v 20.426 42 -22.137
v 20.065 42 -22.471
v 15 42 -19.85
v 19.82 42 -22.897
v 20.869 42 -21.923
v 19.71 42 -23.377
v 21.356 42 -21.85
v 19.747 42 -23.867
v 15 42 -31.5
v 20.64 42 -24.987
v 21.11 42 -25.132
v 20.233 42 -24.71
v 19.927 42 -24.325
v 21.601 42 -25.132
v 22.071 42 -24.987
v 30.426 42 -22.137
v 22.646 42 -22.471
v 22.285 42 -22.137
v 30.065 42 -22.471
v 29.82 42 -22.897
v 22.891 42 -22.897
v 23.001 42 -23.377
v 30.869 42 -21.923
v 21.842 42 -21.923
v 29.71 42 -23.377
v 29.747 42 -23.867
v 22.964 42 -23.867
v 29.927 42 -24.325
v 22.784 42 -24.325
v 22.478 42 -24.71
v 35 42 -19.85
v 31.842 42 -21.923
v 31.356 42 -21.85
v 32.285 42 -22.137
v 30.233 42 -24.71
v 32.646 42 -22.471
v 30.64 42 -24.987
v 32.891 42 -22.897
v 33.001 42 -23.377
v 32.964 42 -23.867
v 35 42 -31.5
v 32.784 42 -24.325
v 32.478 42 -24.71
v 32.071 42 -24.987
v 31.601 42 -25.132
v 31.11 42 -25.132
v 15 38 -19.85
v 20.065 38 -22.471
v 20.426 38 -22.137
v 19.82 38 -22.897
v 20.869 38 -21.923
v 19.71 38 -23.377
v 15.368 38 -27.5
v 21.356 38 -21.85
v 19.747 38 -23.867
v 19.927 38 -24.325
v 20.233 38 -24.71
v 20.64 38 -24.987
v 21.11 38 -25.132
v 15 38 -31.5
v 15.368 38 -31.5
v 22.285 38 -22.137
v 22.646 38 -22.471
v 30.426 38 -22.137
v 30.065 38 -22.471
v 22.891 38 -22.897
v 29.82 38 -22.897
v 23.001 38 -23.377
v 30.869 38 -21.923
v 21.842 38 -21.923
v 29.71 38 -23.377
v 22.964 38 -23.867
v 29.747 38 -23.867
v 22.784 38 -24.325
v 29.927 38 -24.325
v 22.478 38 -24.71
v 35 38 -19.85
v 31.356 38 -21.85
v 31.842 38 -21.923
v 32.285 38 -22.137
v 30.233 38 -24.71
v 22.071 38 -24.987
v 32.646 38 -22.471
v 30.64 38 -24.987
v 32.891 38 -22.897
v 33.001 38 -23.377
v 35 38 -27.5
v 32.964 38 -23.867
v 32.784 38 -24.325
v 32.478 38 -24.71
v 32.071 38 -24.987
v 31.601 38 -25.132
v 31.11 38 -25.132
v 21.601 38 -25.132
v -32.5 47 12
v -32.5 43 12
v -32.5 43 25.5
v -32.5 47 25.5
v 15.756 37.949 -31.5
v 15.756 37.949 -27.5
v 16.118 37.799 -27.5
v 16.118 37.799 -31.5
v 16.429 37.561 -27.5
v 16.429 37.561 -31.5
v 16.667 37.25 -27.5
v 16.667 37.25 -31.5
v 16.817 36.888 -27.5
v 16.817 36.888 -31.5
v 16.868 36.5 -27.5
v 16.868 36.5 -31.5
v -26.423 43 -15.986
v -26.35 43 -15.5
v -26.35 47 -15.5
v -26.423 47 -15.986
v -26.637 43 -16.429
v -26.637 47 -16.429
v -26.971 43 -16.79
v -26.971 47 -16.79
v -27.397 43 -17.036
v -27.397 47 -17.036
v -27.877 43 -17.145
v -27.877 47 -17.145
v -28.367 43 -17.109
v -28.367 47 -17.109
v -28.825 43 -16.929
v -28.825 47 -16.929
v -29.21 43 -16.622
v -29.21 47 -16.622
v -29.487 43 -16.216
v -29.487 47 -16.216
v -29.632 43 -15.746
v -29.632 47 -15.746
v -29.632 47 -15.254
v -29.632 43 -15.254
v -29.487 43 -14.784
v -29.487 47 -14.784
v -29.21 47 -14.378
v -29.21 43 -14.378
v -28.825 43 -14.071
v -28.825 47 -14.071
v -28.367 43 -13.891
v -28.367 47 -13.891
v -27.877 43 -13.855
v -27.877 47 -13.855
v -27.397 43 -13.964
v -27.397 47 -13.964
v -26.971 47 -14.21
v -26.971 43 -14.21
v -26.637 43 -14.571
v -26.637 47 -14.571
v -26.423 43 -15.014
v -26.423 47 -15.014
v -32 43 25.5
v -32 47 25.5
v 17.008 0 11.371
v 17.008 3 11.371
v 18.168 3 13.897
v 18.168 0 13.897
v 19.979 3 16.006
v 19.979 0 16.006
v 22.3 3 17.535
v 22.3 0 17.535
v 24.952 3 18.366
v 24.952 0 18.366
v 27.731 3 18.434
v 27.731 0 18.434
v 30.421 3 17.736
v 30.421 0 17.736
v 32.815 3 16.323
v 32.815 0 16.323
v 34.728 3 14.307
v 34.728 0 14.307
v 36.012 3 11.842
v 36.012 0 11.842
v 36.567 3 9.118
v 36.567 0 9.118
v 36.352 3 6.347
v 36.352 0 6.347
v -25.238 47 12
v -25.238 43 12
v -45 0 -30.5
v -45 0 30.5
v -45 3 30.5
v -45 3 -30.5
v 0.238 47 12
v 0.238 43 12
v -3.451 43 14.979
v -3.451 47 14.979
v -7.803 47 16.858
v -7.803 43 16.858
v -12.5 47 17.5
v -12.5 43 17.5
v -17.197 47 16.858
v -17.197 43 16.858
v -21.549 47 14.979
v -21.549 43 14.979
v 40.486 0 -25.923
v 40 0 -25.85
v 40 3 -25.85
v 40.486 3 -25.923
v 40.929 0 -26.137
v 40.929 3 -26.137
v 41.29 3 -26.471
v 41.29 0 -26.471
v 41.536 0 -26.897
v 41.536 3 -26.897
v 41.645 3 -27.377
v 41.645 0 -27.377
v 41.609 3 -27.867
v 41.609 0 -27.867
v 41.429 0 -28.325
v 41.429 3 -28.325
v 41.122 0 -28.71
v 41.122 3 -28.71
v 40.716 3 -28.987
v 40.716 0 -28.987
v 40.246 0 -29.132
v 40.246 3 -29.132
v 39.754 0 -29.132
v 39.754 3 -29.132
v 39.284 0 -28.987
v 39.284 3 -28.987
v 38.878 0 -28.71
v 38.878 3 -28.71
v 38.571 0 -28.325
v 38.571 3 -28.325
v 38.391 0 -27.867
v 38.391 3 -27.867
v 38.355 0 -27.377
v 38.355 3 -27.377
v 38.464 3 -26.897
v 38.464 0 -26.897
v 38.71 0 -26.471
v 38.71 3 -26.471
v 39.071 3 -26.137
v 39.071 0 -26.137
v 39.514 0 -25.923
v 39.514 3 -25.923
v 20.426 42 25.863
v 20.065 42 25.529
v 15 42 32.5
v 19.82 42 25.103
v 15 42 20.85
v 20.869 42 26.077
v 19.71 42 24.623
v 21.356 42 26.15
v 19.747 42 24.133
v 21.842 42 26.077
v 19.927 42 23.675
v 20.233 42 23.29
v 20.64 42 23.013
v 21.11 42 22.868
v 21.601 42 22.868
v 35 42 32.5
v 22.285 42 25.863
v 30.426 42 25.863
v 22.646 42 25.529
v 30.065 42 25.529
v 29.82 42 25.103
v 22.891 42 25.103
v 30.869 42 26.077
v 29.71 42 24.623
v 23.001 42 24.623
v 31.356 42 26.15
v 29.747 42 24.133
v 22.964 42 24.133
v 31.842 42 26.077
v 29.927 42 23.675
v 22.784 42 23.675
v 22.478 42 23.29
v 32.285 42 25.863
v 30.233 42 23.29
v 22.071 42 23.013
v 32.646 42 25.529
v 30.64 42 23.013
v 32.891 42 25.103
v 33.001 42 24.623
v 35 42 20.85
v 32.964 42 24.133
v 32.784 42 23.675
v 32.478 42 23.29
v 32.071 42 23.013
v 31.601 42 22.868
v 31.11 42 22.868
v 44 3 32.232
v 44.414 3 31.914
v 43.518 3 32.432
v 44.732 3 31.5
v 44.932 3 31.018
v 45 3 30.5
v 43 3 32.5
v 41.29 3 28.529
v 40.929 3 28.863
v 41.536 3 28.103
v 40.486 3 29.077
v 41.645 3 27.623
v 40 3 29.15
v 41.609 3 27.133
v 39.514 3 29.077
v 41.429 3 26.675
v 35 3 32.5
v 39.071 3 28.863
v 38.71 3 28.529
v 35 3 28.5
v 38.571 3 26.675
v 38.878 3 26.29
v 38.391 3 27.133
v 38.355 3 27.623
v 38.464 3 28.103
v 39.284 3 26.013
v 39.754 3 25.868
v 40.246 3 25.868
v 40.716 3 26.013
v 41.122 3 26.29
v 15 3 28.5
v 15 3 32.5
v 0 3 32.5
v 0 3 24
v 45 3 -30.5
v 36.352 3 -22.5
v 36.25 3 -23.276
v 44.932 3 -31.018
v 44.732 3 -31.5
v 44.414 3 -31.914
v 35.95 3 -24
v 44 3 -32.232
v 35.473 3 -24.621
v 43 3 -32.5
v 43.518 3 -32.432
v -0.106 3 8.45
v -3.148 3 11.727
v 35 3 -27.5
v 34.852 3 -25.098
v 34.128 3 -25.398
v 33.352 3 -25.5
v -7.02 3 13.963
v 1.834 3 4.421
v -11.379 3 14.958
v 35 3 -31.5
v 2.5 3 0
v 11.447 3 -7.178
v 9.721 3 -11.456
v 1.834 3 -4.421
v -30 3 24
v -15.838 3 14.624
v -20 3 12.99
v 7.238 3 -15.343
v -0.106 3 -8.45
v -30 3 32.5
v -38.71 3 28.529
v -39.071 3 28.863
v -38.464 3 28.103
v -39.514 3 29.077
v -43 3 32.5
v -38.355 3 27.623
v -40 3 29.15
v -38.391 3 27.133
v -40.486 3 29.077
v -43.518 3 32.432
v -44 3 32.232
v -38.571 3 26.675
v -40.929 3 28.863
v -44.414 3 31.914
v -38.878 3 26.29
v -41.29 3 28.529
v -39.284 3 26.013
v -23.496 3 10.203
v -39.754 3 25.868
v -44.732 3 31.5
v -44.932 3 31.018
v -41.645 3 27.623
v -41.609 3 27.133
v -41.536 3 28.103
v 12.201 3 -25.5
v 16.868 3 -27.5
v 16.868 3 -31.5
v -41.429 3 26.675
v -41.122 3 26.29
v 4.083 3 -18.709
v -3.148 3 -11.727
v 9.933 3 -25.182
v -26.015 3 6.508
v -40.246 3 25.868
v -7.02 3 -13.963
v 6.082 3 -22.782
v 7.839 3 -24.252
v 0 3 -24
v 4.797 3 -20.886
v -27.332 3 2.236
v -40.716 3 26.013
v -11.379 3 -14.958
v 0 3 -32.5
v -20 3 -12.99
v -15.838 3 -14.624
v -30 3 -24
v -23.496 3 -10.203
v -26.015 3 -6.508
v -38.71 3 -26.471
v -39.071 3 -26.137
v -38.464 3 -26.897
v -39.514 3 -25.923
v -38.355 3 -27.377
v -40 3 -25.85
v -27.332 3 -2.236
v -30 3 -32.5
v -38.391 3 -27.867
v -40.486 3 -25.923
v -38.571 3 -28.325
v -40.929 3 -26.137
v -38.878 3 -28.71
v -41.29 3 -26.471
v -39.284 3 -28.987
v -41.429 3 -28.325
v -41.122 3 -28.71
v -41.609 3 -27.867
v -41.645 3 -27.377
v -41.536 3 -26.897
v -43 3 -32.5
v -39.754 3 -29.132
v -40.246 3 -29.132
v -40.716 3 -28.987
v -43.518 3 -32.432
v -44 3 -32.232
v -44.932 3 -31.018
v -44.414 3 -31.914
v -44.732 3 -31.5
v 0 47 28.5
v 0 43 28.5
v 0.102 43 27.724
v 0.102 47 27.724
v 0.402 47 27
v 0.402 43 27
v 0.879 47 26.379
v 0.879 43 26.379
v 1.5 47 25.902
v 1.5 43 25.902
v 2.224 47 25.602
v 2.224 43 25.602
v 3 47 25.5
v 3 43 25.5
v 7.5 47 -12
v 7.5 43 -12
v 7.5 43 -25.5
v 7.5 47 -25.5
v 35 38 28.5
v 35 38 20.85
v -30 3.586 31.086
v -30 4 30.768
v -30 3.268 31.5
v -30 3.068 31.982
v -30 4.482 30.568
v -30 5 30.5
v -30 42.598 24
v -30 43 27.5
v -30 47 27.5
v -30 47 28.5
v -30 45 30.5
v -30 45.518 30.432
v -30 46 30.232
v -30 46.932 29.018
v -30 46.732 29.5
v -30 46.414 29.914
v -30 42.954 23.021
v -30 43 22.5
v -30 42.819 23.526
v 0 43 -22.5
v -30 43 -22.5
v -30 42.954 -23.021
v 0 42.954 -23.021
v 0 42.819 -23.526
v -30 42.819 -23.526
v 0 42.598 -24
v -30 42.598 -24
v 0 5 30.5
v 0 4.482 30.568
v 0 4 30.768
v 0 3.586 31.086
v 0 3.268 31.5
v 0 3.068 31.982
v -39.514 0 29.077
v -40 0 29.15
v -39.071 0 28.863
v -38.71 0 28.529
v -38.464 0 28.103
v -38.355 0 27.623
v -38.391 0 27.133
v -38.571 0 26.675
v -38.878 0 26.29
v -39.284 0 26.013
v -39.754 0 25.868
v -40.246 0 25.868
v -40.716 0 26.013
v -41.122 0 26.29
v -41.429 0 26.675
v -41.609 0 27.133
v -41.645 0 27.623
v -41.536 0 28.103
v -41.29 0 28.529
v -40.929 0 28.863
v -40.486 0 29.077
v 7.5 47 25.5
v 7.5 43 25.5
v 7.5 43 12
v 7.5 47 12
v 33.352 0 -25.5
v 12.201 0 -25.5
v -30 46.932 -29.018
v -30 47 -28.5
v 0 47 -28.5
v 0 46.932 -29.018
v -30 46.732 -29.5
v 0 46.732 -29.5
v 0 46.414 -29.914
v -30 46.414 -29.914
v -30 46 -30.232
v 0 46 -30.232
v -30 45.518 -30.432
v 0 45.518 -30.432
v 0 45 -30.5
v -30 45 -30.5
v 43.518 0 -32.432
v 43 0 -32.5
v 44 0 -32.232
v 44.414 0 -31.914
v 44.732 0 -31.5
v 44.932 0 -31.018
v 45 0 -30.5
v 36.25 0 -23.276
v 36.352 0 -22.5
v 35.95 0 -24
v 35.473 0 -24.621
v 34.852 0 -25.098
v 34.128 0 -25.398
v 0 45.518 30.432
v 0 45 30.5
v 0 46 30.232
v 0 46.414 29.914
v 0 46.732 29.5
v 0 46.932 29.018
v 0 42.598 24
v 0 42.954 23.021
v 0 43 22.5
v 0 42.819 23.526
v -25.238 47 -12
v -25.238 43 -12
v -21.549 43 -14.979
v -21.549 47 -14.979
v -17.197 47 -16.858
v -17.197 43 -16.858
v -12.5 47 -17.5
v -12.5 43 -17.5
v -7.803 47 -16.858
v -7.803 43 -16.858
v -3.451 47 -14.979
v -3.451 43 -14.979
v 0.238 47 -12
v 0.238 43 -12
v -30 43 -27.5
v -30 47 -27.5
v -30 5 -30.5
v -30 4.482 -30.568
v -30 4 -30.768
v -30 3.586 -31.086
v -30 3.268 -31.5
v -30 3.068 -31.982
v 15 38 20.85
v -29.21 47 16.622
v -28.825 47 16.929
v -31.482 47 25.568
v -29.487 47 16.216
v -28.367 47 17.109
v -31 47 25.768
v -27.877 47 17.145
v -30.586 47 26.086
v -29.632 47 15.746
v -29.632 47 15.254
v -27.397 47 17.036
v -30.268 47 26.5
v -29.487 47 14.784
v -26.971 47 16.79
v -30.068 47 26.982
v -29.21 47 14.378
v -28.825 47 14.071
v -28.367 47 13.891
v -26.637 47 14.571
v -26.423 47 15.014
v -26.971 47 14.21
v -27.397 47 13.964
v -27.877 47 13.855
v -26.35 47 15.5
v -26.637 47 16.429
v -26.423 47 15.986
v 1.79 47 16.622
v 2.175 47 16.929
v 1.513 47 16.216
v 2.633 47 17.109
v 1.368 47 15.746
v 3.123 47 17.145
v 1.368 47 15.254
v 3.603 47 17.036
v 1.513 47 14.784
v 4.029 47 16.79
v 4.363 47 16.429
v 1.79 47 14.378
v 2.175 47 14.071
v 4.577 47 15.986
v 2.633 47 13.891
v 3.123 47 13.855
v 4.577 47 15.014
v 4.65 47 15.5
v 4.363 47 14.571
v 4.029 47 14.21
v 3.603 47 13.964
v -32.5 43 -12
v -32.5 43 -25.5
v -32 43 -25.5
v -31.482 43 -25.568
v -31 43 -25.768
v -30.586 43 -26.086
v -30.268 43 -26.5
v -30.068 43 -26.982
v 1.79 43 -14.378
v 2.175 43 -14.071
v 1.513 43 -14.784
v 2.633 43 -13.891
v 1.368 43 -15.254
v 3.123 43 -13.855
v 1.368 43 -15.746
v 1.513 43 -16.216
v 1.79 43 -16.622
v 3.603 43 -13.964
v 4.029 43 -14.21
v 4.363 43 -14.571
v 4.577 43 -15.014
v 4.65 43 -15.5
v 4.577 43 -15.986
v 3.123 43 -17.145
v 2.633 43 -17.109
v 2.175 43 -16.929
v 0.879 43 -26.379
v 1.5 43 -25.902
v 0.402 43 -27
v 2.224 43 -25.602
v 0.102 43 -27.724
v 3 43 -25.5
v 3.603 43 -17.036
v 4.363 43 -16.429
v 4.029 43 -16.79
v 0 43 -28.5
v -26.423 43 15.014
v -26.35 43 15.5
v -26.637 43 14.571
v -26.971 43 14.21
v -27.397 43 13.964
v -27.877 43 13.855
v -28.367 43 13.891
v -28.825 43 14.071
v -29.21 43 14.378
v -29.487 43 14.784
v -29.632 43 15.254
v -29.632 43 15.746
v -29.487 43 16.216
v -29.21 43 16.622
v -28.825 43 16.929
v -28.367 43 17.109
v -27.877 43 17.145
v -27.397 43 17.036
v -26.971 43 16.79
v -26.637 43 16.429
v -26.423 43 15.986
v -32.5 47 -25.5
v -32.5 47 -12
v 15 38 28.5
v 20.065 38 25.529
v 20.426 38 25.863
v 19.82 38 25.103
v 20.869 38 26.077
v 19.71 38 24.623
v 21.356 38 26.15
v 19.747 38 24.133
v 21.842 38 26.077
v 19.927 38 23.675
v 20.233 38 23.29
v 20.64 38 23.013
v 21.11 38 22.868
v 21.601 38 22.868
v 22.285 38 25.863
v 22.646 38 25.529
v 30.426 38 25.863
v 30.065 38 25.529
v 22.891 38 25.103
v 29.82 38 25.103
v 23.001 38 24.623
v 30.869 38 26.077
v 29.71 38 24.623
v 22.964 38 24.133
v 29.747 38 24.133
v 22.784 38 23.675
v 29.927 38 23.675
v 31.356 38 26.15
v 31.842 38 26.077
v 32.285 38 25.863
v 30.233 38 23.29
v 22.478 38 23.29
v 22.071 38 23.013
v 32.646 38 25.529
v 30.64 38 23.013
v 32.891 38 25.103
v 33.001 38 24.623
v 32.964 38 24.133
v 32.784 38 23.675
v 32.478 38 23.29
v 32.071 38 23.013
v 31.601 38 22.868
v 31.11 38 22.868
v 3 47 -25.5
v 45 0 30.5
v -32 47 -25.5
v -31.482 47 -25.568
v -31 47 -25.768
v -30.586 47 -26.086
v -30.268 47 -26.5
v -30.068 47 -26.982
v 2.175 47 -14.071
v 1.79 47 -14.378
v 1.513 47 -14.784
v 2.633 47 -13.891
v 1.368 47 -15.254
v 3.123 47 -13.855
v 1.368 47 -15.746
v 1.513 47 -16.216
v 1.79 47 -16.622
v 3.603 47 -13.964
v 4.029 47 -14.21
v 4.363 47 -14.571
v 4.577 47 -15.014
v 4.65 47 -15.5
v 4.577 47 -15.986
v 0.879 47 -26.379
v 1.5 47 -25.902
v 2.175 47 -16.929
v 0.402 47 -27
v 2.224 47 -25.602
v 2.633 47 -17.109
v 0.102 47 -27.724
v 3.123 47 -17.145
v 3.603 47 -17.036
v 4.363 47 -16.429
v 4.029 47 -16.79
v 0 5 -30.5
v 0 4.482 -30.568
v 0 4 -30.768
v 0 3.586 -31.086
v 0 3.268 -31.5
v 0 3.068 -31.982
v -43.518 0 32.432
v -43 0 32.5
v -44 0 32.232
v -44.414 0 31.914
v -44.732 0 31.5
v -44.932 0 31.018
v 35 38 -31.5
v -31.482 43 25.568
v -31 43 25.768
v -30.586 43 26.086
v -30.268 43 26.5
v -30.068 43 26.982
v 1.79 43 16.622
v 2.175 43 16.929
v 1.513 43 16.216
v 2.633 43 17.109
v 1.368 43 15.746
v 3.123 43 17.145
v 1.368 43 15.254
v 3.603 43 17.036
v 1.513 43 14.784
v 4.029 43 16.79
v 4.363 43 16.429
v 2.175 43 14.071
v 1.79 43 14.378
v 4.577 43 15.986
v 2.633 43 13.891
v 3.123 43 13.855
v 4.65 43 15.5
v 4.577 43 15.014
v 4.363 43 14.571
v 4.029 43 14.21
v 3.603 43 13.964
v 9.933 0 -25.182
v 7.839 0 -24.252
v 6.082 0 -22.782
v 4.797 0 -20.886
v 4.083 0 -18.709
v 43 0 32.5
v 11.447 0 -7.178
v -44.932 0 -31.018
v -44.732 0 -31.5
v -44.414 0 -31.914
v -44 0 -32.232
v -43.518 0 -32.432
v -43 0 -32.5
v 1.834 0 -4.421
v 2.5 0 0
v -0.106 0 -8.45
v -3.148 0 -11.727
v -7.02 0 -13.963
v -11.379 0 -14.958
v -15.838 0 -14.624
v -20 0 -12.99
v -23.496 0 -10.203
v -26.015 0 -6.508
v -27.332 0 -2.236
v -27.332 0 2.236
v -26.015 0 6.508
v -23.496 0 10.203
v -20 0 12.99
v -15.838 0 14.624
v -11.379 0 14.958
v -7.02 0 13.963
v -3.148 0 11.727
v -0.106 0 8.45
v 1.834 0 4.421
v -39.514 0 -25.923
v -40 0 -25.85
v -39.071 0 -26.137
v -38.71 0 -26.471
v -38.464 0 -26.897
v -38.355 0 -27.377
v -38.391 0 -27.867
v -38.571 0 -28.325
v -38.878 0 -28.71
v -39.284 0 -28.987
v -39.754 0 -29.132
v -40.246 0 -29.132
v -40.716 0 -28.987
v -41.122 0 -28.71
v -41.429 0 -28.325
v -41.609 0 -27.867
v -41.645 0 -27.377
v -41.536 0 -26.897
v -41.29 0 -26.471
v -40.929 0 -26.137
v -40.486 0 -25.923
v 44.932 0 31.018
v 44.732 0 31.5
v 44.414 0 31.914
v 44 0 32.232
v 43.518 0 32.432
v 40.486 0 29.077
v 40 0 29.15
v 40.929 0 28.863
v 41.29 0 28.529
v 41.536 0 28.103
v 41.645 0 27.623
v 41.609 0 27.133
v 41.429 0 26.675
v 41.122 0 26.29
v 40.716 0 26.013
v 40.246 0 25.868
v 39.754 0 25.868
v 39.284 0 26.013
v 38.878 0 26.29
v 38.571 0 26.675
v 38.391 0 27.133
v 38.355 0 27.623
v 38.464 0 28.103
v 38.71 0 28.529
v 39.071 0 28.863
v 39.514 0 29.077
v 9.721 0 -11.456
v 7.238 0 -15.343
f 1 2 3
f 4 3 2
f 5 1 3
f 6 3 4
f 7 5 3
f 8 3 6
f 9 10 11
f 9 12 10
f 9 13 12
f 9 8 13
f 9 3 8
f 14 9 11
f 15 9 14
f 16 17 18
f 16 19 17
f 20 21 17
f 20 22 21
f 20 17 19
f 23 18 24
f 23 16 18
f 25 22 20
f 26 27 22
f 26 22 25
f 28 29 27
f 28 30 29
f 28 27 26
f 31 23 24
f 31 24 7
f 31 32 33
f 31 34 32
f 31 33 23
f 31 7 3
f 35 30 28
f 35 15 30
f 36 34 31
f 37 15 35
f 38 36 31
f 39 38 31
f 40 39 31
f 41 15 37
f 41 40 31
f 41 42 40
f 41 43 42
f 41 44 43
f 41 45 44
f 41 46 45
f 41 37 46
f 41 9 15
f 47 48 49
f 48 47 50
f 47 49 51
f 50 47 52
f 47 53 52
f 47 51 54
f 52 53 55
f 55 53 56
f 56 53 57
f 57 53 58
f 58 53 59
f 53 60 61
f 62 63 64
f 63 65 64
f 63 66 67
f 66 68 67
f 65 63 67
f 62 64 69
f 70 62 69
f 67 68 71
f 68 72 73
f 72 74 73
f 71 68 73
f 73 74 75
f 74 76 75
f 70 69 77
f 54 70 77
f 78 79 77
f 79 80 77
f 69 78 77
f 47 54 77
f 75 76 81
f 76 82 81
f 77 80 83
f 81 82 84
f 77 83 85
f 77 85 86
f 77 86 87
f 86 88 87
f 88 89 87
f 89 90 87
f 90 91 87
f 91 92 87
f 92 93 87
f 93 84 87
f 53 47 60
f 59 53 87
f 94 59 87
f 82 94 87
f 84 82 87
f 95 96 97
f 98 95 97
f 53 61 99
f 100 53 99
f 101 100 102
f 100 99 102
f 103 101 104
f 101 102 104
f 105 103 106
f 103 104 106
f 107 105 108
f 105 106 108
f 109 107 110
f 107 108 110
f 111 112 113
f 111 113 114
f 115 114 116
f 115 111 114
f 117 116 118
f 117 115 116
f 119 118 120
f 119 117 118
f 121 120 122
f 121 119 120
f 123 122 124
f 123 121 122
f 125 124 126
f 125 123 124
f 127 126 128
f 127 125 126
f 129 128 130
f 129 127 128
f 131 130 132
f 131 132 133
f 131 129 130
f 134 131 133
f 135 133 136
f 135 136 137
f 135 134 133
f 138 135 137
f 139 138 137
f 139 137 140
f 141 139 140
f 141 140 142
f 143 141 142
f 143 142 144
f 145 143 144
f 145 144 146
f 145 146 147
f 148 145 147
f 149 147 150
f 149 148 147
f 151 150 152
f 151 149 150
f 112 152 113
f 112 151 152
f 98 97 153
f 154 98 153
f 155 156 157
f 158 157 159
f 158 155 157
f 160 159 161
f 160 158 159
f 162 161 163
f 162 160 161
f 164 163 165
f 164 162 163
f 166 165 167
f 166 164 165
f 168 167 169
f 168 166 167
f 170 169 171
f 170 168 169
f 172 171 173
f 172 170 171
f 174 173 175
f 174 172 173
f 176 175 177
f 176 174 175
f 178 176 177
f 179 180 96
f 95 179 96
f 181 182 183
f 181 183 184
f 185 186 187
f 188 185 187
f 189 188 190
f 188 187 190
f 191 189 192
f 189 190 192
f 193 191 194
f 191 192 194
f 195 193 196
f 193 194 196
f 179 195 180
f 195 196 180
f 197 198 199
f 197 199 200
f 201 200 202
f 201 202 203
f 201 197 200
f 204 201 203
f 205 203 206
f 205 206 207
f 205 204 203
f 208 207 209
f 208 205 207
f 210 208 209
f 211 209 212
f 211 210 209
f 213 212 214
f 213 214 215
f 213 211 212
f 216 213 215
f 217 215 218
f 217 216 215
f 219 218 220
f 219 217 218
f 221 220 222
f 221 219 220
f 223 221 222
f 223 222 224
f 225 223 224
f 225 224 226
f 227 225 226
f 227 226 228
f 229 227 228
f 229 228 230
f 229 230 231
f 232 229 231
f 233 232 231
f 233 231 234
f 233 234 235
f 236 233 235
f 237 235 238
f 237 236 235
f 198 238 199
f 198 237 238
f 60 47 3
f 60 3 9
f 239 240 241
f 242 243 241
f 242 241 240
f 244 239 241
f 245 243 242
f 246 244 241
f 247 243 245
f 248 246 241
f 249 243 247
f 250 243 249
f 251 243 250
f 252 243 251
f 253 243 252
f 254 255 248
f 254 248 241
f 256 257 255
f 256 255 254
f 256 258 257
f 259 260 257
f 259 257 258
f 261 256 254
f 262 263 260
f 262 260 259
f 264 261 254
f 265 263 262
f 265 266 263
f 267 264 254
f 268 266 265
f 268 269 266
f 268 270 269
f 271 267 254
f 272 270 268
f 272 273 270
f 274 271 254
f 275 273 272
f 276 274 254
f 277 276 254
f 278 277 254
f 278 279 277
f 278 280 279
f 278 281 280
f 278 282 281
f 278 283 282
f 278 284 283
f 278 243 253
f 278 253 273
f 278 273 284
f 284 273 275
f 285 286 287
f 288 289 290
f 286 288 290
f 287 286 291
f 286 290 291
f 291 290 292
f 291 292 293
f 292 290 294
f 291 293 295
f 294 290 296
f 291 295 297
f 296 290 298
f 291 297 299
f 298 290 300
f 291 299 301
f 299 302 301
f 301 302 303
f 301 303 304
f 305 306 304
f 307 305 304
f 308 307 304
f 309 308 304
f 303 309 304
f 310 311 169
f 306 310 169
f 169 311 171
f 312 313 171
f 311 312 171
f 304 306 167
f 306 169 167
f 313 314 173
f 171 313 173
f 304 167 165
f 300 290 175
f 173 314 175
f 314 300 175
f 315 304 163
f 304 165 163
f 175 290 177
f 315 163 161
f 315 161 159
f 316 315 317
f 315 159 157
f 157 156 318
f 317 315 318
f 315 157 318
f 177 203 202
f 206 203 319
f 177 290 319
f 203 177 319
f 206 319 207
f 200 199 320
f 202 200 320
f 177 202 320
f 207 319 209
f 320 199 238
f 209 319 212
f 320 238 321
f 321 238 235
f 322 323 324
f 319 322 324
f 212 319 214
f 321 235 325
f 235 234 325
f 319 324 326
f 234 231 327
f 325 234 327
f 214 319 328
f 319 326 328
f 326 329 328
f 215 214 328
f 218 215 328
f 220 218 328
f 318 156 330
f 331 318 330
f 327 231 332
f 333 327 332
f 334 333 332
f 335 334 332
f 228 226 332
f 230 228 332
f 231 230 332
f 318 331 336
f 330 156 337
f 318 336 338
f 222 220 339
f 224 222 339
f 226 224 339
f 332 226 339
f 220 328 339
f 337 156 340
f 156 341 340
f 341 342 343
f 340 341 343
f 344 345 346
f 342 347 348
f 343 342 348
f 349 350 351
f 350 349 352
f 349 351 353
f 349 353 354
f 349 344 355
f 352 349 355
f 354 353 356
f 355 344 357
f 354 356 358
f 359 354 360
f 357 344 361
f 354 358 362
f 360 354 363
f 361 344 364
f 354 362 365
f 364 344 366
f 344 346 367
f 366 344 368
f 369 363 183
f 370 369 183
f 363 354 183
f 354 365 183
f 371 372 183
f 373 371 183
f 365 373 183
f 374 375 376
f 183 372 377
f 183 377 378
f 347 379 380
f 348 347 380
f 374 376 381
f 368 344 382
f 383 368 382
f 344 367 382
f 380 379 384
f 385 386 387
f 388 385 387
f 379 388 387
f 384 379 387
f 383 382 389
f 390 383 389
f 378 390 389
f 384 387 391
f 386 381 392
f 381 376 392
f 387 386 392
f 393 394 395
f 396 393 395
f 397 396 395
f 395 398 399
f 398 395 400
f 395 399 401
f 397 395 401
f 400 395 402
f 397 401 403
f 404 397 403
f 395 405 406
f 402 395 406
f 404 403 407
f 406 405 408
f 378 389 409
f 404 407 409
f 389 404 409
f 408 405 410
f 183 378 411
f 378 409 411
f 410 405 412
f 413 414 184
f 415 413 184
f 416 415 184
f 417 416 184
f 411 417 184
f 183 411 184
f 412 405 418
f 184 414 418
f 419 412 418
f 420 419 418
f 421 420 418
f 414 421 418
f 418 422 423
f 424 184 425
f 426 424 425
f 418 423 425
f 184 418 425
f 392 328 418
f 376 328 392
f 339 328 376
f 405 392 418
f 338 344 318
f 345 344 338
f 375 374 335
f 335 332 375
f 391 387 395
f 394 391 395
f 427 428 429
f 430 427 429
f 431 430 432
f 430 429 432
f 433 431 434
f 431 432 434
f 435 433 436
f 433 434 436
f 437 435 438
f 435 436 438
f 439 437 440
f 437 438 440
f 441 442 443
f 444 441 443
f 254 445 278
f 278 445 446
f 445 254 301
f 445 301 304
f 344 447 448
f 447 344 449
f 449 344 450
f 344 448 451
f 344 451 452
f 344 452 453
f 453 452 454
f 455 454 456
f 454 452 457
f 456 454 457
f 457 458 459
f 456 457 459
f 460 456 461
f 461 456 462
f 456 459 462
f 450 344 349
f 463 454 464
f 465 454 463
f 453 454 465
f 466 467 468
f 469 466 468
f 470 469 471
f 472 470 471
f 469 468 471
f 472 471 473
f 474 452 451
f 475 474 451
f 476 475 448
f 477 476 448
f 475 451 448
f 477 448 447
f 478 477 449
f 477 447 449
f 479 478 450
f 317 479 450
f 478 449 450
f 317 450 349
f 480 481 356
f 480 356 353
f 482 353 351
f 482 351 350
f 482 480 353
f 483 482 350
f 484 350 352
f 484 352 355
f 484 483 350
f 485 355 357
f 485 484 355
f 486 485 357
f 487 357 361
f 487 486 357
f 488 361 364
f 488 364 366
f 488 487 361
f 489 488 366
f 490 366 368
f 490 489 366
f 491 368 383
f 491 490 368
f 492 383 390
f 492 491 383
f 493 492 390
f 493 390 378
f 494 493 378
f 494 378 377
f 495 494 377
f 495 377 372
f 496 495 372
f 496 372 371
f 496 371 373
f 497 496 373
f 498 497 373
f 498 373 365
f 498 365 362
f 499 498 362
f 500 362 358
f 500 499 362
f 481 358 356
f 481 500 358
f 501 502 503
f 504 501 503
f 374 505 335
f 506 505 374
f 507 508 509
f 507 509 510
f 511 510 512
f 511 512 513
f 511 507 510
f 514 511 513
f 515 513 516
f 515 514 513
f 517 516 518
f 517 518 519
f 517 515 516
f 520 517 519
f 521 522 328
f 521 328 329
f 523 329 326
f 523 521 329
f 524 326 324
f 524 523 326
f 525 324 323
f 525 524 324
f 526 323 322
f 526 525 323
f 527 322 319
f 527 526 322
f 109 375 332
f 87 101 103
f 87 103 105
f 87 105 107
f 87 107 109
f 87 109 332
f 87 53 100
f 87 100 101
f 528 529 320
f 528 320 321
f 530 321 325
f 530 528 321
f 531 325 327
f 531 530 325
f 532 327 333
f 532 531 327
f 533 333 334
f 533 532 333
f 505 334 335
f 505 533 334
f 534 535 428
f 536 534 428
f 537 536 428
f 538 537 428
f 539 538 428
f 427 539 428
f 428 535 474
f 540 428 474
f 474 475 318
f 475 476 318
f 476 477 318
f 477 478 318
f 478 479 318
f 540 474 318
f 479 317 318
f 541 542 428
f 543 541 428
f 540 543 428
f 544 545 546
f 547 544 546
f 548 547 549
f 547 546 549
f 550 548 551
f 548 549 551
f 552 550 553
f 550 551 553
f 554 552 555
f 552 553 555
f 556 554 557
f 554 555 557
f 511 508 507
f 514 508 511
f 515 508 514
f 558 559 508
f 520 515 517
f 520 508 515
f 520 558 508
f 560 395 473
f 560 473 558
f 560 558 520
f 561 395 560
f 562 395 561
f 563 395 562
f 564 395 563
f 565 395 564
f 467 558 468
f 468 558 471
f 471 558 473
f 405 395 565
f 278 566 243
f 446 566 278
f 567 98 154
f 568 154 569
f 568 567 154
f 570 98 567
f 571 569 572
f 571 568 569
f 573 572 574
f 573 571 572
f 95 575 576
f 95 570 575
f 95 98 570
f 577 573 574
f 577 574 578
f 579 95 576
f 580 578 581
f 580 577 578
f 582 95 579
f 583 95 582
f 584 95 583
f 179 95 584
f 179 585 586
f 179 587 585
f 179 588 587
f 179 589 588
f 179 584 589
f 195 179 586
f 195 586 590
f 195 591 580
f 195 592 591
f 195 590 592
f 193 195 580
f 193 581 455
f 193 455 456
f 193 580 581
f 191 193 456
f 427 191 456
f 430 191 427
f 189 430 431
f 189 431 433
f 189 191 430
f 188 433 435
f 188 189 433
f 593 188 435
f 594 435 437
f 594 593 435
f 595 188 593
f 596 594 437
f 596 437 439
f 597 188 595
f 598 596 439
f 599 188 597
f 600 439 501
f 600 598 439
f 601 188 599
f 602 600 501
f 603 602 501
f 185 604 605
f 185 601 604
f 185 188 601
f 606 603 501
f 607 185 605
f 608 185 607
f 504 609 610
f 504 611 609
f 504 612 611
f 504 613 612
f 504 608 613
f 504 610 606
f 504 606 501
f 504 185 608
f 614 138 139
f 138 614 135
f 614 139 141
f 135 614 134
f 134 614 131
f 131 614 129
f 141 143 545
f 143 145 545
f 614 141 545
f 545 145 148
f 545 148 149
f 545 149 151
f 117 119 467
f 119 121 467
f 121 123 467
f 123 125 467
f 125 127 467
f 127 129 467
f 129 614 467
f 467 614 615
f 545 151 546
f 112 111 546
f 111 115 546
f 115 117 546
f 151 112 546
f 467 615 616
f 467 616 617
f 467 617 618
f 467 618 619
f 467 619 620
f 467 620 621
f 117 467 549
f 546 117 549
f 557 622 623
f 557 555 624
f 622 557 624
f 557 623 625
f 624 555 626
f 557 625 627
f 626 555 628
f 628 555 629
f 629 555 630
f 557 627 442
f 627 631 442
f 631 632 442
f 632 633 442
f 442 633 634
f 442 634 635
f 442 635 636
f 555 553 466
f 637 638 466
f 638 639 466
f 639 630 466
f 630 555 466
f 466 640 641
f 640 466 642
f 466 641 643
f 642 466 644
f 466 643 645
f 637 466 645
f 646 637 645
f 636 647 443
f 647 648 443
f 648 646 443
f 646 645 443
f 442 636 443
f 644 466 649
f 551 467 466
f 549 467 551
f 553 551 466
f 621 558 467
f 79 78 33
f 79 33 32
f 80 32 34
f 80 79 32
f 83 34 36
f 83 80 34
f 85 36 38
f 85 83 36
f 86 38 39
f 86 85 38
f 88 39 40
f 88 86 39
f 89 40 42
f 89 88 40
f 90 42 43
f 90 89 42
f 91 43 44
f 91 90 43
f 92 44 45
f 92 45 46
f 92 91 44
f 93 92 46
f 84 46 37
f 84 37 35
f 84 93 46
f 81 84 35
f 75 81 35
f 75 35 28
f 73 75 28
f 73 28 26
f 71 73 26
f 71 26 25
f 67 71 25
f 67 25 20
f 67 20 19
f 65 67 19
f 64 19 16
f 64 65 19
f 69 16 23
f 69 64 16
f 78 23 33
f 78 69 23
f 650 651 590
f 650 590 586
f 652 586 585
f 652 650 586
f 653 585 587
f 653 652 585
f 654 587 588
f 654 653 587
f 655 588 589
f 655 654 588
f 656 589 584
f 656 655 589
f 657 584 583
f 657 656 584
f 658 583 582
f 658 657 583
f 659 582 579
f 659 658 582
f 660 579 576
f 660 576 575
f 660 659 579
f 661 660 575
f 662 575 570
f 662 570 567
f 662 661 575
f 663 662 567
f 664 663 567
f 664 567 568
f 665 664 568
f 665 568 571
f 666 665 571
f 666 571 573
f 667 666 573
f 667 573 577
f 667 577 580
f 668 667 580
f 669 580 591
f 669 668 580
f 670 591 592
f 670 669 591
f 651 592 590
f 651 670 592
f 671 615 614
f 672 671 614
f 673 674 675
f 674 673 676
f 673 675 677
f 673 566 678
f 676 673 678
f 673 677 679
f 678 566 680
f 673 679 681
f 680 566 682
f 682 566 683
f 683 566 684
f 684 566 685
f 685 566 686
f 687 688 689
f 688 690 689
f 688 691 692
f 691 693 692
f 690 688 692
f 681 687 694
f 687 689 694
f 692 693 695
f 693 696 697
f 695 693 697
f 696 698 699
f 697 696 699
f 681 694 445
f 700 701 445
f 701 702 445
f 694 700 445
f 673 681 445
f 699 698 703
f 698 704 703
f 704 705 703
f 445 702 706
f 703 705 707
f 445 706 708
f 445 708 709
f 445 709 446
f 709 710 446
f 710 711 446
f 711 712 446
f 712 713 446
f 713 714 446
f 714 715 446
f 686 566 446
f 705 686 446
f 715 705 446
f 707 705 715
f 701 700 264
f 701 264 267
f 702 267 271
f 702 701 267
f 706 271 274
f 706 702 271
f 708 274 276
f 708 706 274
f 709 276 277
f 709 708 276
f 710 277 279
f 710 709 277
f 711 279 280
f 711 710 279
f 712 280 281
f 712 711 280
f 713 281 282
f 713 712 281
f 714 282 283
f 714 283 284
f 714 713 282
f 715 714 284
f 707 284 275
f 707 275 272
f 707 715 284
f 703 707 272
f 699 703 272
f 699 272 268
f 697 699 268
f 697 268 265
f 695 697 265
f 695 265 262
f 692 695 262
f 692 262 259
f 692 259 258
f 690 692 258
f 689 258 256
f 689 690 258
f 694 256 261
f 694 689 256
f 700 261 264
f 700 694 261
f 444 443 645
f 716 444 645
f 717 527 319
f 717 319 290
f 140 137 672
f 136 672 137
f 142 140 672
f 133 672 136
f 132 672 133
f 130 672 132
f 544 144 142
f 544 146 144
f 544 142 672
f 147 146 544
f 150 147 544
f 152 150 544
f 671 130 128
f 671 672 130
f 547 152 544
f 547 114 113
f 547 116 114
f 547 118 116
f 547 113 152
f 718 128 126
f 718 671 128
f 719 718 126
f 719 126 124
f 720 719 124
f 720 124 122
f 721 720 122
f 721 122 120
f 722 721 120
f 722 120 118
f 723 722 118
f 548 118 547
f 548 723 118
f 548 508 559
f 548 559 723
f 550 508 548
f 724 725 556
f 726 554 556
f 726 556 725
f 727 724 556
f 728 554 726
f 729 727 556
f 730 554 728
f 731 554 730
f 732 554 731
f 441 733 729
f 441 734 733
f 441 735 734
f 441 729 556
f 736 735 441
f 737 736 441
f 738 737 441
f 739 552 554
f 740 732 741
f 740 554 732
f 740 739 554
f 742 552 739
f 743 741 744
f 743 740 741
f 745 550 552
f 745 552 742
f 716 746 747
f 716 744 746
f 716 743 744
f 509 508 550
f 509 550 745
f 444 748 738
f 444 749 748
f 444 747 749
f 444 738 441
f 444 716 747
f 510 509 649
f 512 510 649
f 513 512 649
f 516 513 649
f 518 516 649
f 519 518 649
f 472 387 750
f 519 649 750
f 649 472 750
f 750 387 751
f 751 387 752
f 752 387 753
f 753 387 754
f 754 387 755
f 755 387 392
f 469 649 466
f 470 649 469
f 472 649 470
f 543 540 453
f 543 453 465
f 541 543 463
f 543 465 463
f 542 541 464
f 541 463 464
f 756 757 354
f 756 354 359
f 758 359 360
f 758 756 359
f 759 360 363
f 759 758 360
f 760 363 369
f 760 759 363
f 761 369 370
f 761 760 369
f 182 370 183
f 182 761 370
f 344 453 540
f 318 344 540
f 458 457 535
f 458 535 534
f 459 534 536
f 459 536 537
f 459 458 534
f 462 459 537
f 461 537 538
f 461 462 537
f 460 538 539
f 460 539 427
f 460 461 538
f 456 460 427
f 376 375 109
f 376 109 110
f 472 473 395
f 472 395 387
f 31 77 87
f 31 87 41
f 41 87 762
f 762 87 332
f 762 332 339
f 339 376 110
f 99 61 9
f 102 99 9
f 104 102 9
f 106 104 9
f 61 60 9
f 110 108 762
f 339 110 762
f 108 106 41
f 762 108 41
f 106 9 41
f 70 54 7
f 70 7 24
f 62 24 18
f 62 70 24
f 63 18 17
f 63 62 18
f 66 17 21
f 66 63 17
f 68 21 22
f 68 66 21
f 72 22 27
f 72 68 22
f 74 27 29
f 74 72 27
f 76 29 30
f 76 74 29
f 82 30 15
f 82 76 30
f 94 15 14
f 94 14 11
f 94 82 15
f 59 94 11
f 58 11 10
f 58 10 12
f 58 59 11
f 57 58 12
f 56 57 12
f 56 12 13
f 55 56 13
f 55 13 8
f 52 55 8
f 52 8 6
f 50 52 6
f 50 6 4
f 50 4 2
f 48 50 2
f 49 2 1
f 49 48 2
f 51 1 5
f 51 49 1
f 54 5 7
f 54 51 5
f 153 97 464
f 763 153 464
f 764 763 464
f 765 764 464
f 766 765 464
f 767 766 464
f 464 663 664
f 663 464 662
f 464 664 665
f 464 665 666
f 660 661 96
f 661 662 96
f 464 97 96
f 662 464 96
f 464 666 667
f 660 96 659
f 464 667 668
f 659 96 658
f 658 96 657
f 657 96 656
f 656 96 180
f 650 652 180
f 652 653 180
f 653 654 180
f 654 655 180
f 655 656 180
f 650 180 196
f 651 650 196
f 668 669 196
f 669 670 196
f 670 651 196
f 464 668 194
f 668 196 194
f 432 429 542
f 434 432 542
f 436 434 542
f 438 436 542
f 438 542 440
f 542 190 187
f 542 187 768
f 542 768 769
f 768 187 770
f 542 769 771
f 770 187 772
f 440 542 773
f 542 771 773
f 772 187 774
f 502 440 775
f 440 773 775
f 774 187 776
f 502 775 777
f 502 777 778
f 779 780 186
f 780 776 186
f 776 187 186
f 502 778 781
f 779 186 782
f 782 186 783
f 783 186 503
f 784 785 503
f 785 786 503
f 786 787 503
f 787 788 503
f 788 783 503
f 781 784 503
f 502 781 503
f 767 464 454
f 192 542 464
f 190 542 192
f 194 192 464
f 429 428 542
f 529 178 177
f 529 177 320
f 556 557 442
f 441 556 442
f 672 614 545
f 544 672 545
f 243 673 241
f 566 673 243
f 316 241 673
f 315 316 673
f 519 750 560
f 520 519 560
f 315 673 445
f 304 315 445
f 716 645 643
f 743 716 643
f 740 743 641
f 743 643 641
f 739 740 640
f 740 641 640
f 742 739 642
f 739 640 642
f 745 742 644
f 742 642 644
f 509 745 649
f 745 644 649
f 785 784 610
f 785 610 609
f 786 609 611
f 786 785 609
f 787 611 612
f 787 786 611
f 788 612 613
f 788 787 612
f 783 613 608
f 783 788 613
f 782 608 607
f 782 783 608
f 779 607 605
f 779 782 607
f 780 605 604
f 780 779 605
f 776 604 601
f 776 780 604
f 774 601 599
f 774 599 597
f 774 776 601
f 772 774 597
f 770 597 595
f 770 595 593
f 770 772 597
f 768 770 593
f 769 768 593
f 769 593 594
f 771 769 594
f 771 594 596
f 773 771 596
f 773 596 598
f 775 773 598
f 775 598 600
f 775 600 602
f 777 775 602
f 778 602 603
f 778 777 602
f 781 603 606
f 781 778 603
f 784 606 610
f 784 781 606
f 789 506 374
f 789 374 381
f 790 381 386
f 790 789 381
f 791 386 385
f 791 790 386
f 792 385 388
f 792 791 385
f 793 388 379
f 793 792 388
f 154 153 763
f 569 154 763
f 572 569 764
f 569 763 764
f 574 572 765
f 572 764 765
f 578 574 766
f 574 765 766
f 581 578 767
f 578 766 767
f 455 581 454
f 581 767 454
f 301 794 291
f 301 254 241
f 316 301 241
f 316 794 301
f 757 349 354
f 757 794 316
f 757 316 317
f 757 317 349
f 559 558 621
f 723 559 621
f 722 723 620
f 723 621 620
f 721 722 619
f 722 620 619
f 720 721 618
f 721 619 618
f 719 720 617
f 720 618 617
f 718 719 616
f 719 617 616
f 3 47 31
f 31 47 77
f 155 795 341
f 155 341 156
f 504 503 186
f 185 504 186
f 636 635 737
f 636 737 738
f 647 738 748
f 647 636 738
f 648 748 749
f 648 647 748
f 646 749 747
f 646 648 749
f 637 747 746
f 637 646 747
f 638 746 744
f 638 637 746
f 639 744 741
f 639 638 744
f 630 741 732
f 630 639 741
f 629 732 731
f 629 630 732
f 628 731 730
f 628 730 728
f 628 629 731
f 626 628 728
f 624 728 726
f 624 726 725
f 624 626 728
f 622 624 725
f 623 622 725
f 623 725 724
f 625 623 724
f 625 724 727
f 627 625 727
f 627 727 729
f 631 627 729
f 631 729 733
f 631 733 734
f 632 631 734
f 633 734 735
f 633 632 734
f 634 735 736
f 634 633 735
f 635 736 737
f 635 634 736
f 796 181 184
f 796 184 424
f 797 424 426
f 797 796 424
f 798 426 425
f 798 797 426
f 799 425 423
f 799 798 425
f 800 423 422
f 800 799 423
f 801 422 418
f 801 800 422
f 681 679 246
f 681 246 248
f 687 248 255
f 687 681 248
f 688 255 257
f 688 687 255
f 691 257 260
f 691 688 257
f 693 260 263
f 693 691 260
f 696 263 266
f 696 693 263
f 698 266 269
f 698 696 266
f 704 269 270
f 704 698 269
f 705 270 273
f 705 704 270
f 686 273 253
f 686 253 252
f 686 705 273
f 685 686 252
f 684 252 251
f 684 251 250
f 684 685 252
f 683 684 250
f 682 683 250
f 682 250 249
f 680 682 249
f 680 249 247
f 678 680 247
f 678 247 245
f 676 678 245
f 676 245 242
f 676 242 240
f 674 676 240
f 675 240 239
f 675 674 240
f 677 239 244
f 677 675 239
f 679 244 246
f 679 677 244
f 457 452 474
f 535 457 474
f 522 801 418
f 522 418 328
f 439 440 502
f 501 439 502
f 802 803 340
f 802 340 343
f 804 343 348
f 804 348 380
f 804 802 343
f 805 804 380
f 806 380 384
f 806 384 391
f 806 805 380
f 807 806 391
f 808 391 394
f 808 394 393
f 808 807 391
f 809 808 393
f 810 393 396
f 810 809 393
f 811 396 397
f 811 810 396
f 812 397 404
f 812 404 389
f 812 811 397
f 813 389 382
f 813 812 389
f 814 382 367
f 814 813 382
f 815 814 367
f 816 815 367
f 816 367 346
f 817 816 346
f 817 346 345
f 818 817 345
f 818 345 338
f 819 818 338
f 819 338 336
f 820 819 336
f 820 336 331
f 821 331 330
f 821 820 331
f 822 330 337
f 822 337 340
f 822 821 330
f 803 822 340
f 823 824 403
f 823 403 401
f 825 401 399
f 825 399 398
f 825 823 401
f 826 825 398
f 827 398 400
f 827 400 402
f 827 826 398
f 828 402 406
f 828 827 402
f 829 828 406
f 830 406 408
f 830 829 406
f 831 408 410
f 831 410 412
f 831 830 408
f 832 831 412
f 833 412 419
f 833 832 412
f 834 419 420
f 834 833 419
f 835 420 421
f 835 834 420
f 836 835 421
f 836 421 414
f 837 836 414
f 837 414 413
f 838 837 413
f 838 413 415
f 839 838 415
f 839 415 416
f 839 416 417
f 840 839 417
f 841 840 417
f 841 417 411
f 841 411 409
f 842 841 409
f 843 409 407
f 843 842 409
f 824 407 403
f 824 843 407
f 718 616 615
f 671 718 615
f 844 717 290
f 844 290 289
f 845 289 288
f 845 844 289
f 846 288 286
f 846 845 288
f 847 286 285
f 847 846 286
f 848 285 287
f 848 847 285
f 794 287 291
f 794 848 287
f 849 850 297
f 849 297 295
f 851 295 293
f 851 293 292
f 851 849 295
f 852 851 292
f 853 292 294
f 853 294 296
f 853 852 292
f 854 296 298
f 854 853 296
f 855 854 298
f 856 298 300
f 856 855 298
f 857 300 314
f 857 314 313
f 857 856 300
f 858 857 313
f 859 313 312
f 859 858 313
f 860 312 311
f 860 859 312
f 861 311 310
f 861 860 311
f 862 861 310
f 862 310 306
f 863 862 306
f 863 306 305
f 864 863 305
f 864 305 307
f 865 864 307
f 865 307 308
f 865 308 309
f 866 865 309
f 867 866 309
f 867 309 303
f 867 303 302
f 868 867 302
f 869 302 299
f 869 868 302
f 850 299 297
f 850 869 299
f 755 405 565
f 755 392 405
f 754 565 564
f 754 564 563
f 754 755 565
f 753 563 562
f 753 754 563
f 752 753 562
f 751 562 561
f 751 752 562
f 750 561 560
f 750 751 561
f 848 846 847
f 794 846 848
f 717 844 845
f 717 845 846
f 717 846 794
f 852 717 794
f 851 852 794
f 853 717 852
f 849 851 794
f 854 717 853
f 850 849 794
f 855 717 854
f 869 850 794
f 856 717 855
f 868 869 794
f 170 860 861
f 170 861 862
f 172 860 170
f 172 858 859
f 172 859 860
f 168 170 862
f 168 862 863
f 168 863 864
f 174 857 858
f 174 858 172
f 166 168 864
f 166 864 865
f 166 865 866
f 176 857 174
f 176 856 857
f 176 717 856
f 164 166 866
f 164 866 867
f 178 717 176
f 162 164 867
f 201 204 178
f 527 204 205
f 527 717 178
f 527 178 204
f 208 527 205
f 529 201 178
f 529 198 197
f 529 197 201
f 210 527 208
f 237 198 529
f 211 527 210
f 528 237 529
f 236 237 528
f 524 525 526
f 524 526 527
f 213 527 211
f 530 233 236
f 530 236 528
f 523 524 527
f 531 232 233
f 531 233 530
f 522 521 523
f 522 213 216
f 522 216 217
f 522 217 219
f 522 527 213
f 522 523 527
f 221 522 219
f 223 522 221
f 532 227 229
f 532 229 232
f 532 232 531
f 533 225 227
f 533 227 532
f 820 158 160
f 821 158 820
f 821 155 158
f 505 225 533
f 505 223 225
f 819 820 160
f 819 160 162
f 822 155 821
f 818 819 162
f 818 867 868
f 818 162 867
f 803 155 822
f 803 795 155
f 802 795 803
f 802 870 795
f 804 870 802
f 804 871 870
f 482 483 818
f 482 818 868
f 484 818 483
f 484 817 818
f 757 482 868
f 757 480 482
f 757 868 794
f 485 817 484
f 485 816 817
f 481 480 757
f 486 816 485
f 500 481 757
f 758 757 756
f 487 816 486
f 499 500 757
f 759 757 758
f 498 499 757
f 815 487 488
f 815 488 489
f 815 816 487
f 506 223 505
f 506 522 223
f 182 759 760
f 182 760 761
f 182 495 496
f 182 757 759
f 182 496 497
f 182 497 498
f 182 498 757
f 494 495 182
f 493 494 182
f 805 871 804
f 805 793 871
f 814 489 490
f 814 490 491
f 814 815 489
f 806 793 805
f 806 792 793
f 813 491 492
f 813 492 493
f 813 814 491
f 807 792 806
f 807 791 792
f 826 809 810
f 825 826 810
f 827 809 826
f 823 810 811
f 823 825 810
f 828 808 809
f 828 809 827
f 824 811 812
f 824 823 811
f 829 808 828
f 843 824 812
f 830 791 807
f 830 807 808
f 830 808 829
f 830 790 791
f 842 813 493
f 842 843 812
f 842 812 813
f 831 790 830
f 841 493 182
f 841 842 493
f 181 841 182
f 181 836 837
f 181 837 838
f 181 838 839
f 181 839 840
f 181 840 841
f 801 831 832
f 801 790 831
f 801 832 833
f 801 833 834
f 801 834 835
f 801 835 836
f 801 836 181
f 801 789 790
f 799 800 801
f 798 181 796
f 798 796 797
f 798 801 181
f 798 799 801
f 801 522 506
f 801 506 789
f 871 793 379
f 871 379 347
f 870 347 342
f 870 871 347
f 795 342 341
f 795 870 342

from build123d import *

# Parameters (mm, degrees)
SKETCH_1_R                = 1.65
EXTRUDE_2_DEPTH           = 3
SKETCH_2_W                = 30
SKETCH_2_H                = 5
EXTRUDE_3_DEPTH           = 40
FILLET_1_R                = 2
EXTRUDE_START             = -30
EXTRUDE_4_DEPTH           = 30
EXTRUDE_4_2_OUTLINE_R     = 1.65
EXTRUDE_4_2_DEPTH         = 4
CUT_EXTRUDE_START         = -30
CUT_EXTRUDE_1_DEPTH       = 30
CUT_EXTRUDE_START_2       = -32.5
CUT_EXTRUDE_1_2_DEPTH     = 40
CUT_EXTRUDE_START_3       = -3
CUT_EXTRUDE_1_3_OUTLINE_R = 15
CUT_EXTRUDE_1_3_DEPTH     = 3
SKETCH_7_W                = 18.132065191
SKETCH_7_H                = 4
SKETCH_7_R                = 10
SKETCH_7_W_2              = 20
EXTRUDE_6_DEPTH           = 35
SKETCH_9_W                = 20
SKETCH_9_H                = 11.65
SKETCH_9_R                = 1.65
EXTRUDE_7_DEPTH           = 4
CUT_EXTRUDE_START_4       = -31.5
CUT_EXTRUDE_2_DEPTH       = 4
CUT_EXTRUDE_START_5       = -39
CUT_EXTRUDE_2_2_OUTLINE_R = 10
CUT_EXTRUDE_2_2_DEPTH     = 40
CUT_EXTRUDE_START_6       = -1000
CUT_EXTRUDE_3_DEPTH       = 1000
SKETCH_13_W               = 30
SKETCH_13_H               = 1.5
EXTRUDE_8_DEPTH           = 40


with BuildPart() as part:
    # 草图1 → 凸台-拉伸2 (new body)
    with BuildSketch(Plane(origin=(0, 0, 0), x_dir=(1, 0, 0), z_dir=(0, 1, 0))):
        with BuildLine():
            Line((-43, 32.5), (43, 32.5))
            ThreePointArc((43, 32.5), (44.414213562, 31.914213562), (45, 30.5))
            Line((45, 30.5), (45, -30.5))
            ThreePointArc((45, -30.5), (44.414213562, -31.914213562), (43, -32.5))
            Line((43, -32.5), (-43, -32.5))
            ThreePointArc((-43, -32.5), (-44.414213562, -31.914213562), (-45, -30.5))
            Line((-45, -30.5), (-45, 30.5))
            ThreePointArc((-45, 30.5), (-44.414213562, 31.914213562), (-43, 32.5))
        make_face()
        with Locations(Location((-40, 27.5, 0), (0, 0, 270))):
            Circle(SKETCH_1_R, mode=Mode.SUBTRACT)
        with Locations(Location((40, 27.5, 0), (0, 0, 270))):
            Circle(SKETCH_1_R, mode=Mode.SUBTRACT)
        with Locations(Location((-40, -27.5, 0), (0, 0, 270))):
            Circle(SKETCH_1_R, mode=Mode.SUBTRACT)
        with Locations(Location((40, -27.5, 0), (0, 0, 270))):
            Circle(SKETCH_1_R, mode=Mode.SUBTRACT)
    extrude(amount=EXTRUDE_2_DEPTH)

    # 草图2 → 凸台-拉伸3 (add)
    with BuildSketch(Plane(origin=(0, 3, 0), x_dir=(1, 0, 0), z_dir=(0, 1, 0))):
        with Locations((-15, 28)):
            Rectangle(SKETCH_2_W, SKETCH_2_H)
        with Locations((-15, -28)):
            Rectangle(SKETCH_2_W, SKETCH_2_H)
    extrude(amount=EXTRUDE_3_DEPTH)

    # 圆角1
    fillet_1_edges = [part.edges().sort_by_distance(p)[0] for p in [
        (-15, 3, -30.5),
    ]]
    fillet(fillet_1_edges, radius=FILLET_1_R - 0.0001)  # a hair under: the kernel refuses the full size

    # 凸台-拉伸4: read off the stored shape, not the designer's step
    # 凸台-拉伸4 outline → 凸台-拉伸4 (add)
    with BuildSketch(Plane.YZ.offset(EXTRUDE_START)):
        with BuildLine():
            ThreePointArc((5, 30.5), (3.585786438, 31.085786438), (3, 32.5))
            Line((3, 32.5), (3, 30.5))
            Line((3, 30.5), (5, 30.5))
        make_face()
    extrude(amount=EXTRUDE_4_DEPTH)

    # Extrude 4 2 outline → Extrude 4 2 (add)
    # profile 1 of 2: a face of its own
    with BuildSketch(Plane(origin=(0, 43, 0), x_dir=(1, 0, 0), z_dir=(0, 1, 0))):
        with BuildLine():
            Line((7.5, 12), (7.5, 25.5))
            Line((7.5, 25.5), (3, 25.5))
            ThreePointArc((3, 25.5), (0.878679656, 26.378679656), (0, 28.5))
            Line((0, 28.5), (0, 30.5))
            Line((0, 30.5), (-30, 30.5))
            Line((-30, 30.5), (-30, 27.5))
            ThreePointArc((-30, 27.5), (-30.585786438, 26.085786438), (-32, 25.5))
            Line((-32, 25.5), (-32.5, 25.5))
            Line((-32.5, 25.5), (-32.5, 12))
            Line((-32.5, 12), (-25.237739203, 12))
            ThreePointArc((-25.237739203, 12), (-12.5, 17.5), (0.237739203, 12))
            Line((0.237739203, 12), (7.5, 12))
        make_face()
        with Locations((-28, 15.5)):
            Circle(EXTRUDE_4_2_OUTLINE_R, mode=Mode.SUBTRACT)
        with Locations((3, 15.5)):
            Circle(EXTRUDE_4_2_OUTLINE_R, mode=Mode.SUBTRACT)
    # profile 2 of 2: a face of its own
    with BuildSketch(Plane(origin=(0, 43, 0), x_dir=(1, 0, 0), z_dir=(0, 1, 0))):
        with BuildLine():
            Line((-25.237739203, -12), (-32.5, -12))
            Line((-32.5, -12), (-32.5, -25.5))
            Line((-32.5, -25.5), (-32, -25.5))
            ThreePointArc((-32, -25.5), (-30.585786438, -26.085786438), (-30, -27.5))
            Line((-30, -27.5), (-30, -30.5))
            Line((-30, -30.5), (0, -30.5))
            Line((0, -30.5), (0, -28.5))
            ThreePointArc((0, -28.5), (0.878679656, -26.378679656), (3, -25.5))
            Line((3, -25.5), (7.5, -25.5))
            Line((7.5, -25.5), (7.5, -12))
            Line((7.5, -12), (0.237739203, -12))
            ThreePointArc((0.237739203, -12), (-12.5, -17.5), (-25.237739203, -12))
        make_face()
        with Locations((-28, -15.5)):
            Circle(EXTRUDE_4_2_OUTLINE_R, mode=Mode.SUBTRACT)
        with Locations((3, -15.5)):
            Circle(EXTRUDE_4_2_OUTLINE_R, mode=Mode.SUBTRACT)
    extrude(amount=EXTRUDE_4_2_DEPTH)

    # 切除-拉伸1: read off the stored shape, not the designer's step
    # 切除-拉伸1 outline → 切除-拉伸1 (add)
    with BuildSketch(Plane.YZ.offset(CUT_EXTRUDE_START)):
        with BuildLine():
            ThreePointArc((40, 25.5), (42.121320344, 24.621320344), (43, 22.5))
            Line((43, 22.5), (43, 25.5))
            Line((43, 25.5), (40, 25.5))
        make_face()
        with BuildLine():
            ThreePointArc((43, -22.5), (42.121320344, -24.621320344), (40, -25.5))
            Line((40, -25.5), (43, -25.5))
            Line((43, -25.5), (43, -22.5))
        make_face()
    extrude(amount=CUT_EXTRUDE_1_DEPTH)

    # Cut-Extrude 1 2 outline → Cut-Extrude 1 2 (cut)
    with BuildSketch(Plane.YZ.offset(CUT_EXTRUDE_START_2)):
        with BuildLine():
            Line((47, 30.5), (45, 30.5))
            ThreePointArc((45, 30.5), (46.414213562, 29.914213562), (47, 28.5))
            Line((47, 28.5), (47, 30.5))
        make_face()
        with BuildLine():
            Line((47, -30.5), (47, -28.5))
            ThreePointArc((47, -28.5), (46.414213562, -29.914213562), (45, -30.5))
            Line((45, -30.5), (47, -30.5))
        make_face()
    extrude(amount=CUT_EXTRUDE_1_2_DEPTH, mode=Mode.SUBTRACT)

    # Cut-Extrude 1 3 outline → Cut-Extrude 1 3 (cut)
    with BuildSketch(Plane(origin=(0, 3, 0), x_dir=(1, 0, 0), z_dir=(0, 1, 0)).offset(CUT_EXTRUDE_START_3)):
        with Locations((-12.5, 0)):
            Circle(CUT_EXTRUDE_1_3_OUTLINE_R)
    extrude(amount=CUT_EXTRUDE_1_3_DEPTH, mode=Mode.SUBTRACT)

    # 草图7 → 凸台-拉伸6 (add)
    with BuildSketch(Plane(origin=(0, 3, 0), x_dir=(1, 0, 0), z_dir=(0, 1, 0))):
        with Locations((25.933967405, 29.5)):
            Rectangle(SKETCH_7_W, SKETCH_7_H)
        with Locations(Location((26.586442662, -8.5, 0), (0, 0, 270))):
            Circle(SKETCH_7_R)
        with Locations((25, -30.5)):
            Rectangle(SKETCH_7_W_2, SKETCH_7_H)
    extrude(amount=EXTRUDE_6_DEPTH)

    # 草图9 → 凸台-拉伸7 (add)
    # profile 1 of 2: a face of its own
    with BuildSketch(Plane(origin=(0, 38, 0), x_dir=(1, 0, 0), z_dir=(0, 1, 0))):
        with Locations((25, 25.675)):
            Rectangle(SKETCH_9_W, SKETCH_9_H)
        with Locations(Location((31.355501541, 23.5, 0), (0, 0, 270))):
            Circle(SKETCH_9_R, mode=Mode.SUBTRACT)
        with Locations(Location((21.355501541, 23.5, 0), (0, 0, 270))):
            Circle(SKETCH_9_R, mode=Mode.SUBTRACT)
    # profile 2 of 2: a face of its own
    with BuildSketch(Plane(origin=(0, 38, 0), x_dir=(1, 0, 0), z_dir=(0, 1, 0))):
        with Locations((25, -26.675)):
            Rectangle(SKETCH_9_W, SKETCH_9_H)
        with Locations(Location((31.355501541, -24.5, 0), (0, 0, 270))):
            Circle(SKETCH_9_R, mode=Mode.SUBTRACT)
        with Locations(Location((21.355501541, -24.5, 0), (0, 0, 270))):
            Circle(SKETCH_9_R, mode=Mode.SUBTRACT)
    extrude(amount=EXTRUDE_7_DEPTH)

    # 切除-拉伸2: read off the stored shape, not the designer's step
    # 切除-拉伸2 outline → 切除-拉伸2 (add)
    with BuildSketch(Plane.XY.offset(CUT_EXTRUDE_START_4)):
        with BuildLine():
            ThreePointArc((15.367934809, 38), (16.42859498, 37.560660171), (16.867934809, 36.5))
            Line((16.867934809, 36.5), (16.867934809, 38))
            Line((16.867934809, 38), (15.367934809, 38))
        make_face()
    extrude(amount=CUT_EXTRUDE_2_DEPTH)

    # Cut-Extrude 2 2 outline → Cut-Extrude 2 2 (cut)
    with BuildSketch(Plane(origin=(0, 38, 0), x_dir=(1, 0, 0), z_dir=(0, 1, 0)).offset(CUT_EXTRUDE_START_5)):
        with Locations((26.586442662, -8.5)):
            Circle(CUT_EXTRUDE_2_2_OUTLINE_R)
    extrude(amount=CUT_EXTRUDE_2_2_DEPTH, mode=Mode.SUBTRACT)

    # 草图11 → 切除-拉伸3 (cut)
    with BuildSketch(Plane(origin=(0, 3, 0), x_dir=(1, 0, 0), z_dir=(0, 1, 0)).offset(CUT_EXTRUDE_START_6)):
        with BuildLine():
            Line((36.351968475, -6.347209811), (36.351968475, 22.5))
            ThreePointArc((36.351968475, 22.5), (35.473288819, 24.621320344), (33.351968475, 25.5))
            Line((33.351968475, 25.5), (12.201289858, 25.5))
            ThreePointArc((12.201289858, 25.5), (6.908991343, 23.578301134), (4.082716458, 18.708648131))
            ThreePointArc((4.082716458, 18.708648131), (8.569131741, 13.457031161), (11.447301334, 7.178214179))
            Line((11.447301334, 7.178214179), (17.007522129, -11.371285672))
            ThreePointArc((17.007522129, -11.371285672), (24.072672596, 1.178892501), (36.351968475, -6.347209811))
        make_face()
    extrude(amount=CUT_EXTRUDE_3_DEPTH, mode=Mode.SUBTRACT)

    # 草图13 → 凸台-拉伸8 (add)
    with BuildSketch(Plane(origin=(0, 3, 0), x_dir=(1, 0, 0), z_dir=(0, 1, 0))):
        with Locations((-15, 24.75)):
            Rectangle(SKETCH_13_W, SKETCH_13_H)
        with Locations((-15, -24.75)):
            Rectangle(SKETCH_13_W, SKETCH_13_H)
    extrude(amount=EXTRUDE_8_DEPTH)


solid = part.part
